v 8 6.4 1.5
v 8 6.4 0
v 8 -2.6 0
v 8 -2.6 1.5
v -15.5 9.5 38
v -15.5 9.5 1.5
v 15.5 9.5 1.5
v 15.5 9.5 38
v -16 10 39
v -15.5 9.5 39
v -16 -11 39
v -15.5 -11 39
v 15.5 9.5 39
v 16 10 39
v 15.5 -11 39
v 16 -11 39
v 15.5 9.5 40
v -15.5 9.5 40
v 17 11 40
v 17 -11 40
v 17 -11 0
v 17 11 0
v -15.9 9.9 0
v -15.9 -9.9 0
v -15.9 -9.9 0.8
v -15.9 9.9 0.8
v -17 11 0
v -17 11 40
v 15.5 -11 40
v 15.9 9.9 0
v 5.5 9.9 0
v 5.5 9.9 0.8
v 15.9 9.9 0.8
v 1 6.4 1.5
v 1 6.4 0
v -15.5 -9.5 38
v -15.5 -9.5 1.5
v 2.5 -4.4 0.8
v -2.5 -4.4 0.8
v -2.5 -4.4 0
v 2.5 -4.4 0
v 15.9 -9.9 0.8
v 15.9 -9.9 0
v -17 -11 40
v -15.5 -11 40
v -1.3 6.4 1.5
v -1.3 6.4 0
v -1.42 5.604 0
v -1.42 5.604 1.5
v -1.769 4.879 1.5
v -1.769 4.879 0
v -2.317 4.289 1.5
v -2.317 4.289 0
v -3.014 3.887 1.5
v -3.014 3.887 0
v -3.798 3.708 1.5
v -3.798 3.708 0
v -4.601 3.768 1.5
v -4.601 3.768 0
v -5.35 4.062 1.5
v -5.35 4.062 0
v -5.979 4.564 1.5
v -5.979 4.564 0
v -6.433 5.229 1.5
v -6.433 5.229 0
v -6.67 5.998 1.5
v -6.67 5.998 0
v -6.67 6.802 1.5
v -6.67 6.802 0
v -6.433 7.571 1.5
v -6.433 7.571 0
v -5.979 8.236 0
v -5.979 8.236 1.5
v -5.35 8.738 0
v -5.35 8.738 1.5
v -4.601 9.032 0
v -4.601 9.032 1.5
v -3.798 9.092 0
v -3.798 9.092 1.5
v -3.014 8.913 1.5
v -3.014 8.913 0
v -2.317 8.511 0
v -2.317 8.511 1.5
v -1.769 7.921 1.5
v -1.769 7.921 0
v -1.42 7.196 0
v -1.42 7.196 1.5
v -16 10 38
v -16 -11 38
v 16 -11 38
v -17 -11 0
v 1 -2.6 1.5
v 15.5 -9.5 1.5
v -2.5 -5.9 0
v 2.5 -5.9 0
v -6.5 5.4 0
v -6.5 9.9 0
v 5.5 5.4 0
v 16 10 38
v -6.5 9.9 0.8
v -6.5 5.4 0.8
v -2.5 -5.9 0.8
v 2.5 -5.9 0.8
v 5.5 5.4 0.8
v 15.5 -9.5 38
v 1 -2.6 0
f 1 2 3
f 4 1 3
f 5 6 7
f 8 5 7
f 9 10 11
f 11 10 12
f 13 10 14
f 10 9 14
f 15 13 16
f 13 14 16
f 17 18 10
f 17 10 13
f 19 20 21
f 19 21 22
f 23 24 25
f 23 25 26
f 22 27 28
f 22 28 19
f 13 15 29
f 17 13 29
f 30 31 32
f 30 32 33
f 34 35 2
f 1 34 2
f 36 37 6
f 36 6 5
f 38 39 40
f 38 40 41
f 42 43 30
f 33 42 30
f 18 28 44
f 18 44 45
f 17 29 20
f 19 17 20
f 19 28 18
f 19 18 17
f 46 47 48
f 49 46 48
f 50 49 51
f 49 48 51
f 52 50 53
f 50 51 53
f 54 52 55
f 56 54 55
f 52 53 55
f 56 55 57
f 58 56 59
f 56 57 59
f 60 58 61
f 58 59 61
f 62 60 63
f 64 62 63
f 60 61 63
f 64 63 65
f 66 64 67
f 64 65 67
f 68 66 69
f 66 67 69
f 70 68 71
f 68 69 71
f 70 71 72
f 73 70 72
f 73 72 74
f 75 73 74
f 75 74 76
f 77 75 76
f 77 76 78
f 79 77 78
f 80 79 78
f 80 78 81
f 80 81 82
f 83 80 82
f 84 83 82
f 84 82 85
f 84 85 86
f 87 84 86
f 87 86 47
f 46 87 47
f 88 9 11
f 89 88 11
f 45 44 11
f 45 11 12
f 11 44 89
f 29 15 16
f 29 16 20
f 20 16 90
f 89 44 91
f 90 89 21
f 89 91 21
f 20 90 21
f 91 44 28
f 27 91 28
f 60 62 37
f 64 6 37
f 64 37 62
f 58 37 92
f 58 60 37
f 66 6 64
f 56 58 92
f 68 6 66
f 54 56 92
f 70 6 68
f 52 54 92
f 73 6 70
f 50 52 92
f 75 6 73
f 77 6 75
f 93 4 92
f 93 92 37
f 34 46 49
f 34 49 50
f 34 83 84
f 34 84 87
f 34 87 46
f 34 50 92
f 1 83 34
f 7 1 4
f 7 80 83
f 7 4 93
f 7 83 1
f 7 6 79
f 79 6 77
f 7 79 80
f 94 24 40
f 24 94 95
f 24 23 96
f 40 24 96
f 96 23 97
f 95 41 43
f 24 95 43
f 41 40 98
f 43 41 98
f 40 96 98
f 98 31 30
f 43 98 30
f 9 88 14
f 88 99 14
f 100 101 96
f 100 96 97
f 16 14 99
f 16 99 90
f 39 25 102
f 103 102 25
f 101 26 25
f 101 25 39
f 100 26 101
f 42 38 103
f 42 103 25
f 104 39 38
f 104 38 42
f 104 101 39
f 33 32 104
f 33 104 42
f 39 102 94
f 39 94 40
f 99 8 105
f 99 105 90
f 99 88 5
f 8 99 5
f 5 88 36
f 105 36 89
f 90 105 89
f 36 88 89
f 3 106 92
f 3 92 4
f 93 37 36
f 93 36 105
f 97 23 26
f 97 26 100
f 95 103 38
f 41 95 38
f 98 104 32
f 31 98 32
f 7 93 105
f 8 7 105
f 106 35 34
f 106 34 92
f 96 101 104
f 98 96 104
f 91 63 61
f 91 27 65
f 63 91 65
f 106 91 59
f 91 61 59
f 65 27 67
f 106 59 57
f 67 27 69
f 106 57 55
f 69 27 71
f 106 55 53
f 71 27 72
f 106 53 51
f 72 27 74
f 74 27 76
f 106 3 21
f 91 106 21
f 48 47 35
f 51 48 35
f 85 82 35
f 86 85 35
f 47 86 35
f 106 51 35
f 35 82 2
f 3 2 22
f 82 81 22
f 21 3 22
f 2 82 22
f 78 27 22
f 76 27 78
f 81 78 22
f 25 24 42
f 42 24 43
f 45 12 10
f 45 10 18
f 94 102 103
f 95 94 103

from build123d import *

# Parameters (mm, degrees)
SKETCH_W        = 34
SKETCH_H        = 22
PAD_DEPTH       = 40
SKETCH001_W     = 31
SKETCH001_H     = 19
POCKET_DEPTH    = 38.5
SKETCH002_R     = 2.7
SKETCH002_W     = 7
SKETCH002_H     = 9
POCKET001_DEPTH = 40.001
SKETCH003_W     = 31
SKETCH003_H     = 2
POCKET002_DEPTH = 1.5
SKETCH004_W     = 21
SKETCH004_H     = 1
POCKET003_DEPTH = 0.5
SKETCH009_W     = 32
SKETCH009_H     = 1
POCKET007_DEPTH = 0.5
SKETCH006_W     = 31.8
SKETCH006_H     = 19.8
PAD001_DEPTH    = 0.8
SKETCH007_W     = 12
SKETCH007_H     = 4.5
POCKET005_DEPTH = 0.801
SKETCH008_W     = 5
SKETCH008_H     = 1.5
POCKET006_DEPTH = 0.801


with BuildPart() as body:
    # Sketch → Pad (new body)
    with BuildSketch(Plane.XY):
        Rectangle(SKETCH_W, SKETCH_H)
    extrude(amount=PAD_DEPTH)

    # Sketch001 (on Face6 of Pad) → Pocket (cut)
    with BuildSketch(Plane.XY.offset(40)):
        Rectangle(SKETCH001_W, SKETCH001_H)
    extrude(amount=-POCKET_DEPTH, mode=Mode.SUBTRACT)

    # Sketch002 (on Face4 of Pocket) → Pocket001 (cut, through all)
    with BuildSketch(Plane(origin=(0, 0, 0), x_dir=(1, 0, 0), z_dir=(0, 0, -1))):
        with Locations((-4, -6.4)):
            Circle(SKETCH002_R)
        with Locations((4.5, -1.9)):
            Rectangle(SKETCH002_W, SKETCH002_H)
    extrude(amount=-POCKET001_DEPTH, mode=Mode.SUBTRACT)

    # Sketch003 (on Face6 of Pocket001) → Pocket002 (cut)
    with BuildSketch(Plane.XZ.offset(11)):
        with Locations((0, 39)):
            Rectangle(SKETCH003_W, SKETCH003_H)
    extrude(amount=-POCKET002_DEPTH, mode=Mode.SUBTRACT)

    # Sketch004 (on Face16 of Pocket002) → Pocket003 (cut)
    with BuildSketch(Plane(origin=(15.5, 0, 0), x_dir=(0, -1, 0), z_dir=(-1, 0, 0))):
        with Locations((0.5, 38.5)):
            Rectangle(SKETCH004_W, SKETCH004_H)
    pocket003 = extrude(amount=-POCKET003_DEPTH, mode=Mode.SUBTRACT)

    # Mirrored: Pocket003 across YZ
    add(pocket003.mirror(Plane.YZ), mode=Mode.SUBTRACT)

    # Sketch009 (on Face14 of Mirrored) → Pocket007 (cut)
    with BuildSketch(Plane.XZ.offset(-9.5)):
        with Locations((0, 38.5)):
            Rectangle(SKETCH009_W, SKETCH009_H)
    extrude(amount=-POCKET007_DEPTH, mode=Mode.SUBTRACT)


with BuildPart() as top:
    # Sketch006 → Pad001 (new body)
    with BuildSketch(Plane.XY):
        Rectangle(SKETCH006_W, SKETCH006_H)
    extrude(amount=PAD001_DEPTH)

    # Sketch007 (on Face6 of Pad001) → Pocket005 (cut, through all)
    with BuildSketch(Plane.XY.offset(0.8)):
        with Locations((-0.5, 7.65)):
            Rectangle(SKETCH007_W, SKETCH007_H)
    extrude(amount=-POCKET005_DEPTH, mode=Mode.SUBTRACT)

    # Sketch008 (on Face4 of Pocket005) → Pocket006 (cut, through all)
    with BuildSketch(Plane.XY.offset(0.8)):
        with Locations((0, -5.15)):
            Rectangle(SKETCH008_W, SKETCH008_H)
    extrude(amount=-POCKET006_DEPTH, mode=Mode.SUBTRACT)


solid = Compound([body.part, top.part])
